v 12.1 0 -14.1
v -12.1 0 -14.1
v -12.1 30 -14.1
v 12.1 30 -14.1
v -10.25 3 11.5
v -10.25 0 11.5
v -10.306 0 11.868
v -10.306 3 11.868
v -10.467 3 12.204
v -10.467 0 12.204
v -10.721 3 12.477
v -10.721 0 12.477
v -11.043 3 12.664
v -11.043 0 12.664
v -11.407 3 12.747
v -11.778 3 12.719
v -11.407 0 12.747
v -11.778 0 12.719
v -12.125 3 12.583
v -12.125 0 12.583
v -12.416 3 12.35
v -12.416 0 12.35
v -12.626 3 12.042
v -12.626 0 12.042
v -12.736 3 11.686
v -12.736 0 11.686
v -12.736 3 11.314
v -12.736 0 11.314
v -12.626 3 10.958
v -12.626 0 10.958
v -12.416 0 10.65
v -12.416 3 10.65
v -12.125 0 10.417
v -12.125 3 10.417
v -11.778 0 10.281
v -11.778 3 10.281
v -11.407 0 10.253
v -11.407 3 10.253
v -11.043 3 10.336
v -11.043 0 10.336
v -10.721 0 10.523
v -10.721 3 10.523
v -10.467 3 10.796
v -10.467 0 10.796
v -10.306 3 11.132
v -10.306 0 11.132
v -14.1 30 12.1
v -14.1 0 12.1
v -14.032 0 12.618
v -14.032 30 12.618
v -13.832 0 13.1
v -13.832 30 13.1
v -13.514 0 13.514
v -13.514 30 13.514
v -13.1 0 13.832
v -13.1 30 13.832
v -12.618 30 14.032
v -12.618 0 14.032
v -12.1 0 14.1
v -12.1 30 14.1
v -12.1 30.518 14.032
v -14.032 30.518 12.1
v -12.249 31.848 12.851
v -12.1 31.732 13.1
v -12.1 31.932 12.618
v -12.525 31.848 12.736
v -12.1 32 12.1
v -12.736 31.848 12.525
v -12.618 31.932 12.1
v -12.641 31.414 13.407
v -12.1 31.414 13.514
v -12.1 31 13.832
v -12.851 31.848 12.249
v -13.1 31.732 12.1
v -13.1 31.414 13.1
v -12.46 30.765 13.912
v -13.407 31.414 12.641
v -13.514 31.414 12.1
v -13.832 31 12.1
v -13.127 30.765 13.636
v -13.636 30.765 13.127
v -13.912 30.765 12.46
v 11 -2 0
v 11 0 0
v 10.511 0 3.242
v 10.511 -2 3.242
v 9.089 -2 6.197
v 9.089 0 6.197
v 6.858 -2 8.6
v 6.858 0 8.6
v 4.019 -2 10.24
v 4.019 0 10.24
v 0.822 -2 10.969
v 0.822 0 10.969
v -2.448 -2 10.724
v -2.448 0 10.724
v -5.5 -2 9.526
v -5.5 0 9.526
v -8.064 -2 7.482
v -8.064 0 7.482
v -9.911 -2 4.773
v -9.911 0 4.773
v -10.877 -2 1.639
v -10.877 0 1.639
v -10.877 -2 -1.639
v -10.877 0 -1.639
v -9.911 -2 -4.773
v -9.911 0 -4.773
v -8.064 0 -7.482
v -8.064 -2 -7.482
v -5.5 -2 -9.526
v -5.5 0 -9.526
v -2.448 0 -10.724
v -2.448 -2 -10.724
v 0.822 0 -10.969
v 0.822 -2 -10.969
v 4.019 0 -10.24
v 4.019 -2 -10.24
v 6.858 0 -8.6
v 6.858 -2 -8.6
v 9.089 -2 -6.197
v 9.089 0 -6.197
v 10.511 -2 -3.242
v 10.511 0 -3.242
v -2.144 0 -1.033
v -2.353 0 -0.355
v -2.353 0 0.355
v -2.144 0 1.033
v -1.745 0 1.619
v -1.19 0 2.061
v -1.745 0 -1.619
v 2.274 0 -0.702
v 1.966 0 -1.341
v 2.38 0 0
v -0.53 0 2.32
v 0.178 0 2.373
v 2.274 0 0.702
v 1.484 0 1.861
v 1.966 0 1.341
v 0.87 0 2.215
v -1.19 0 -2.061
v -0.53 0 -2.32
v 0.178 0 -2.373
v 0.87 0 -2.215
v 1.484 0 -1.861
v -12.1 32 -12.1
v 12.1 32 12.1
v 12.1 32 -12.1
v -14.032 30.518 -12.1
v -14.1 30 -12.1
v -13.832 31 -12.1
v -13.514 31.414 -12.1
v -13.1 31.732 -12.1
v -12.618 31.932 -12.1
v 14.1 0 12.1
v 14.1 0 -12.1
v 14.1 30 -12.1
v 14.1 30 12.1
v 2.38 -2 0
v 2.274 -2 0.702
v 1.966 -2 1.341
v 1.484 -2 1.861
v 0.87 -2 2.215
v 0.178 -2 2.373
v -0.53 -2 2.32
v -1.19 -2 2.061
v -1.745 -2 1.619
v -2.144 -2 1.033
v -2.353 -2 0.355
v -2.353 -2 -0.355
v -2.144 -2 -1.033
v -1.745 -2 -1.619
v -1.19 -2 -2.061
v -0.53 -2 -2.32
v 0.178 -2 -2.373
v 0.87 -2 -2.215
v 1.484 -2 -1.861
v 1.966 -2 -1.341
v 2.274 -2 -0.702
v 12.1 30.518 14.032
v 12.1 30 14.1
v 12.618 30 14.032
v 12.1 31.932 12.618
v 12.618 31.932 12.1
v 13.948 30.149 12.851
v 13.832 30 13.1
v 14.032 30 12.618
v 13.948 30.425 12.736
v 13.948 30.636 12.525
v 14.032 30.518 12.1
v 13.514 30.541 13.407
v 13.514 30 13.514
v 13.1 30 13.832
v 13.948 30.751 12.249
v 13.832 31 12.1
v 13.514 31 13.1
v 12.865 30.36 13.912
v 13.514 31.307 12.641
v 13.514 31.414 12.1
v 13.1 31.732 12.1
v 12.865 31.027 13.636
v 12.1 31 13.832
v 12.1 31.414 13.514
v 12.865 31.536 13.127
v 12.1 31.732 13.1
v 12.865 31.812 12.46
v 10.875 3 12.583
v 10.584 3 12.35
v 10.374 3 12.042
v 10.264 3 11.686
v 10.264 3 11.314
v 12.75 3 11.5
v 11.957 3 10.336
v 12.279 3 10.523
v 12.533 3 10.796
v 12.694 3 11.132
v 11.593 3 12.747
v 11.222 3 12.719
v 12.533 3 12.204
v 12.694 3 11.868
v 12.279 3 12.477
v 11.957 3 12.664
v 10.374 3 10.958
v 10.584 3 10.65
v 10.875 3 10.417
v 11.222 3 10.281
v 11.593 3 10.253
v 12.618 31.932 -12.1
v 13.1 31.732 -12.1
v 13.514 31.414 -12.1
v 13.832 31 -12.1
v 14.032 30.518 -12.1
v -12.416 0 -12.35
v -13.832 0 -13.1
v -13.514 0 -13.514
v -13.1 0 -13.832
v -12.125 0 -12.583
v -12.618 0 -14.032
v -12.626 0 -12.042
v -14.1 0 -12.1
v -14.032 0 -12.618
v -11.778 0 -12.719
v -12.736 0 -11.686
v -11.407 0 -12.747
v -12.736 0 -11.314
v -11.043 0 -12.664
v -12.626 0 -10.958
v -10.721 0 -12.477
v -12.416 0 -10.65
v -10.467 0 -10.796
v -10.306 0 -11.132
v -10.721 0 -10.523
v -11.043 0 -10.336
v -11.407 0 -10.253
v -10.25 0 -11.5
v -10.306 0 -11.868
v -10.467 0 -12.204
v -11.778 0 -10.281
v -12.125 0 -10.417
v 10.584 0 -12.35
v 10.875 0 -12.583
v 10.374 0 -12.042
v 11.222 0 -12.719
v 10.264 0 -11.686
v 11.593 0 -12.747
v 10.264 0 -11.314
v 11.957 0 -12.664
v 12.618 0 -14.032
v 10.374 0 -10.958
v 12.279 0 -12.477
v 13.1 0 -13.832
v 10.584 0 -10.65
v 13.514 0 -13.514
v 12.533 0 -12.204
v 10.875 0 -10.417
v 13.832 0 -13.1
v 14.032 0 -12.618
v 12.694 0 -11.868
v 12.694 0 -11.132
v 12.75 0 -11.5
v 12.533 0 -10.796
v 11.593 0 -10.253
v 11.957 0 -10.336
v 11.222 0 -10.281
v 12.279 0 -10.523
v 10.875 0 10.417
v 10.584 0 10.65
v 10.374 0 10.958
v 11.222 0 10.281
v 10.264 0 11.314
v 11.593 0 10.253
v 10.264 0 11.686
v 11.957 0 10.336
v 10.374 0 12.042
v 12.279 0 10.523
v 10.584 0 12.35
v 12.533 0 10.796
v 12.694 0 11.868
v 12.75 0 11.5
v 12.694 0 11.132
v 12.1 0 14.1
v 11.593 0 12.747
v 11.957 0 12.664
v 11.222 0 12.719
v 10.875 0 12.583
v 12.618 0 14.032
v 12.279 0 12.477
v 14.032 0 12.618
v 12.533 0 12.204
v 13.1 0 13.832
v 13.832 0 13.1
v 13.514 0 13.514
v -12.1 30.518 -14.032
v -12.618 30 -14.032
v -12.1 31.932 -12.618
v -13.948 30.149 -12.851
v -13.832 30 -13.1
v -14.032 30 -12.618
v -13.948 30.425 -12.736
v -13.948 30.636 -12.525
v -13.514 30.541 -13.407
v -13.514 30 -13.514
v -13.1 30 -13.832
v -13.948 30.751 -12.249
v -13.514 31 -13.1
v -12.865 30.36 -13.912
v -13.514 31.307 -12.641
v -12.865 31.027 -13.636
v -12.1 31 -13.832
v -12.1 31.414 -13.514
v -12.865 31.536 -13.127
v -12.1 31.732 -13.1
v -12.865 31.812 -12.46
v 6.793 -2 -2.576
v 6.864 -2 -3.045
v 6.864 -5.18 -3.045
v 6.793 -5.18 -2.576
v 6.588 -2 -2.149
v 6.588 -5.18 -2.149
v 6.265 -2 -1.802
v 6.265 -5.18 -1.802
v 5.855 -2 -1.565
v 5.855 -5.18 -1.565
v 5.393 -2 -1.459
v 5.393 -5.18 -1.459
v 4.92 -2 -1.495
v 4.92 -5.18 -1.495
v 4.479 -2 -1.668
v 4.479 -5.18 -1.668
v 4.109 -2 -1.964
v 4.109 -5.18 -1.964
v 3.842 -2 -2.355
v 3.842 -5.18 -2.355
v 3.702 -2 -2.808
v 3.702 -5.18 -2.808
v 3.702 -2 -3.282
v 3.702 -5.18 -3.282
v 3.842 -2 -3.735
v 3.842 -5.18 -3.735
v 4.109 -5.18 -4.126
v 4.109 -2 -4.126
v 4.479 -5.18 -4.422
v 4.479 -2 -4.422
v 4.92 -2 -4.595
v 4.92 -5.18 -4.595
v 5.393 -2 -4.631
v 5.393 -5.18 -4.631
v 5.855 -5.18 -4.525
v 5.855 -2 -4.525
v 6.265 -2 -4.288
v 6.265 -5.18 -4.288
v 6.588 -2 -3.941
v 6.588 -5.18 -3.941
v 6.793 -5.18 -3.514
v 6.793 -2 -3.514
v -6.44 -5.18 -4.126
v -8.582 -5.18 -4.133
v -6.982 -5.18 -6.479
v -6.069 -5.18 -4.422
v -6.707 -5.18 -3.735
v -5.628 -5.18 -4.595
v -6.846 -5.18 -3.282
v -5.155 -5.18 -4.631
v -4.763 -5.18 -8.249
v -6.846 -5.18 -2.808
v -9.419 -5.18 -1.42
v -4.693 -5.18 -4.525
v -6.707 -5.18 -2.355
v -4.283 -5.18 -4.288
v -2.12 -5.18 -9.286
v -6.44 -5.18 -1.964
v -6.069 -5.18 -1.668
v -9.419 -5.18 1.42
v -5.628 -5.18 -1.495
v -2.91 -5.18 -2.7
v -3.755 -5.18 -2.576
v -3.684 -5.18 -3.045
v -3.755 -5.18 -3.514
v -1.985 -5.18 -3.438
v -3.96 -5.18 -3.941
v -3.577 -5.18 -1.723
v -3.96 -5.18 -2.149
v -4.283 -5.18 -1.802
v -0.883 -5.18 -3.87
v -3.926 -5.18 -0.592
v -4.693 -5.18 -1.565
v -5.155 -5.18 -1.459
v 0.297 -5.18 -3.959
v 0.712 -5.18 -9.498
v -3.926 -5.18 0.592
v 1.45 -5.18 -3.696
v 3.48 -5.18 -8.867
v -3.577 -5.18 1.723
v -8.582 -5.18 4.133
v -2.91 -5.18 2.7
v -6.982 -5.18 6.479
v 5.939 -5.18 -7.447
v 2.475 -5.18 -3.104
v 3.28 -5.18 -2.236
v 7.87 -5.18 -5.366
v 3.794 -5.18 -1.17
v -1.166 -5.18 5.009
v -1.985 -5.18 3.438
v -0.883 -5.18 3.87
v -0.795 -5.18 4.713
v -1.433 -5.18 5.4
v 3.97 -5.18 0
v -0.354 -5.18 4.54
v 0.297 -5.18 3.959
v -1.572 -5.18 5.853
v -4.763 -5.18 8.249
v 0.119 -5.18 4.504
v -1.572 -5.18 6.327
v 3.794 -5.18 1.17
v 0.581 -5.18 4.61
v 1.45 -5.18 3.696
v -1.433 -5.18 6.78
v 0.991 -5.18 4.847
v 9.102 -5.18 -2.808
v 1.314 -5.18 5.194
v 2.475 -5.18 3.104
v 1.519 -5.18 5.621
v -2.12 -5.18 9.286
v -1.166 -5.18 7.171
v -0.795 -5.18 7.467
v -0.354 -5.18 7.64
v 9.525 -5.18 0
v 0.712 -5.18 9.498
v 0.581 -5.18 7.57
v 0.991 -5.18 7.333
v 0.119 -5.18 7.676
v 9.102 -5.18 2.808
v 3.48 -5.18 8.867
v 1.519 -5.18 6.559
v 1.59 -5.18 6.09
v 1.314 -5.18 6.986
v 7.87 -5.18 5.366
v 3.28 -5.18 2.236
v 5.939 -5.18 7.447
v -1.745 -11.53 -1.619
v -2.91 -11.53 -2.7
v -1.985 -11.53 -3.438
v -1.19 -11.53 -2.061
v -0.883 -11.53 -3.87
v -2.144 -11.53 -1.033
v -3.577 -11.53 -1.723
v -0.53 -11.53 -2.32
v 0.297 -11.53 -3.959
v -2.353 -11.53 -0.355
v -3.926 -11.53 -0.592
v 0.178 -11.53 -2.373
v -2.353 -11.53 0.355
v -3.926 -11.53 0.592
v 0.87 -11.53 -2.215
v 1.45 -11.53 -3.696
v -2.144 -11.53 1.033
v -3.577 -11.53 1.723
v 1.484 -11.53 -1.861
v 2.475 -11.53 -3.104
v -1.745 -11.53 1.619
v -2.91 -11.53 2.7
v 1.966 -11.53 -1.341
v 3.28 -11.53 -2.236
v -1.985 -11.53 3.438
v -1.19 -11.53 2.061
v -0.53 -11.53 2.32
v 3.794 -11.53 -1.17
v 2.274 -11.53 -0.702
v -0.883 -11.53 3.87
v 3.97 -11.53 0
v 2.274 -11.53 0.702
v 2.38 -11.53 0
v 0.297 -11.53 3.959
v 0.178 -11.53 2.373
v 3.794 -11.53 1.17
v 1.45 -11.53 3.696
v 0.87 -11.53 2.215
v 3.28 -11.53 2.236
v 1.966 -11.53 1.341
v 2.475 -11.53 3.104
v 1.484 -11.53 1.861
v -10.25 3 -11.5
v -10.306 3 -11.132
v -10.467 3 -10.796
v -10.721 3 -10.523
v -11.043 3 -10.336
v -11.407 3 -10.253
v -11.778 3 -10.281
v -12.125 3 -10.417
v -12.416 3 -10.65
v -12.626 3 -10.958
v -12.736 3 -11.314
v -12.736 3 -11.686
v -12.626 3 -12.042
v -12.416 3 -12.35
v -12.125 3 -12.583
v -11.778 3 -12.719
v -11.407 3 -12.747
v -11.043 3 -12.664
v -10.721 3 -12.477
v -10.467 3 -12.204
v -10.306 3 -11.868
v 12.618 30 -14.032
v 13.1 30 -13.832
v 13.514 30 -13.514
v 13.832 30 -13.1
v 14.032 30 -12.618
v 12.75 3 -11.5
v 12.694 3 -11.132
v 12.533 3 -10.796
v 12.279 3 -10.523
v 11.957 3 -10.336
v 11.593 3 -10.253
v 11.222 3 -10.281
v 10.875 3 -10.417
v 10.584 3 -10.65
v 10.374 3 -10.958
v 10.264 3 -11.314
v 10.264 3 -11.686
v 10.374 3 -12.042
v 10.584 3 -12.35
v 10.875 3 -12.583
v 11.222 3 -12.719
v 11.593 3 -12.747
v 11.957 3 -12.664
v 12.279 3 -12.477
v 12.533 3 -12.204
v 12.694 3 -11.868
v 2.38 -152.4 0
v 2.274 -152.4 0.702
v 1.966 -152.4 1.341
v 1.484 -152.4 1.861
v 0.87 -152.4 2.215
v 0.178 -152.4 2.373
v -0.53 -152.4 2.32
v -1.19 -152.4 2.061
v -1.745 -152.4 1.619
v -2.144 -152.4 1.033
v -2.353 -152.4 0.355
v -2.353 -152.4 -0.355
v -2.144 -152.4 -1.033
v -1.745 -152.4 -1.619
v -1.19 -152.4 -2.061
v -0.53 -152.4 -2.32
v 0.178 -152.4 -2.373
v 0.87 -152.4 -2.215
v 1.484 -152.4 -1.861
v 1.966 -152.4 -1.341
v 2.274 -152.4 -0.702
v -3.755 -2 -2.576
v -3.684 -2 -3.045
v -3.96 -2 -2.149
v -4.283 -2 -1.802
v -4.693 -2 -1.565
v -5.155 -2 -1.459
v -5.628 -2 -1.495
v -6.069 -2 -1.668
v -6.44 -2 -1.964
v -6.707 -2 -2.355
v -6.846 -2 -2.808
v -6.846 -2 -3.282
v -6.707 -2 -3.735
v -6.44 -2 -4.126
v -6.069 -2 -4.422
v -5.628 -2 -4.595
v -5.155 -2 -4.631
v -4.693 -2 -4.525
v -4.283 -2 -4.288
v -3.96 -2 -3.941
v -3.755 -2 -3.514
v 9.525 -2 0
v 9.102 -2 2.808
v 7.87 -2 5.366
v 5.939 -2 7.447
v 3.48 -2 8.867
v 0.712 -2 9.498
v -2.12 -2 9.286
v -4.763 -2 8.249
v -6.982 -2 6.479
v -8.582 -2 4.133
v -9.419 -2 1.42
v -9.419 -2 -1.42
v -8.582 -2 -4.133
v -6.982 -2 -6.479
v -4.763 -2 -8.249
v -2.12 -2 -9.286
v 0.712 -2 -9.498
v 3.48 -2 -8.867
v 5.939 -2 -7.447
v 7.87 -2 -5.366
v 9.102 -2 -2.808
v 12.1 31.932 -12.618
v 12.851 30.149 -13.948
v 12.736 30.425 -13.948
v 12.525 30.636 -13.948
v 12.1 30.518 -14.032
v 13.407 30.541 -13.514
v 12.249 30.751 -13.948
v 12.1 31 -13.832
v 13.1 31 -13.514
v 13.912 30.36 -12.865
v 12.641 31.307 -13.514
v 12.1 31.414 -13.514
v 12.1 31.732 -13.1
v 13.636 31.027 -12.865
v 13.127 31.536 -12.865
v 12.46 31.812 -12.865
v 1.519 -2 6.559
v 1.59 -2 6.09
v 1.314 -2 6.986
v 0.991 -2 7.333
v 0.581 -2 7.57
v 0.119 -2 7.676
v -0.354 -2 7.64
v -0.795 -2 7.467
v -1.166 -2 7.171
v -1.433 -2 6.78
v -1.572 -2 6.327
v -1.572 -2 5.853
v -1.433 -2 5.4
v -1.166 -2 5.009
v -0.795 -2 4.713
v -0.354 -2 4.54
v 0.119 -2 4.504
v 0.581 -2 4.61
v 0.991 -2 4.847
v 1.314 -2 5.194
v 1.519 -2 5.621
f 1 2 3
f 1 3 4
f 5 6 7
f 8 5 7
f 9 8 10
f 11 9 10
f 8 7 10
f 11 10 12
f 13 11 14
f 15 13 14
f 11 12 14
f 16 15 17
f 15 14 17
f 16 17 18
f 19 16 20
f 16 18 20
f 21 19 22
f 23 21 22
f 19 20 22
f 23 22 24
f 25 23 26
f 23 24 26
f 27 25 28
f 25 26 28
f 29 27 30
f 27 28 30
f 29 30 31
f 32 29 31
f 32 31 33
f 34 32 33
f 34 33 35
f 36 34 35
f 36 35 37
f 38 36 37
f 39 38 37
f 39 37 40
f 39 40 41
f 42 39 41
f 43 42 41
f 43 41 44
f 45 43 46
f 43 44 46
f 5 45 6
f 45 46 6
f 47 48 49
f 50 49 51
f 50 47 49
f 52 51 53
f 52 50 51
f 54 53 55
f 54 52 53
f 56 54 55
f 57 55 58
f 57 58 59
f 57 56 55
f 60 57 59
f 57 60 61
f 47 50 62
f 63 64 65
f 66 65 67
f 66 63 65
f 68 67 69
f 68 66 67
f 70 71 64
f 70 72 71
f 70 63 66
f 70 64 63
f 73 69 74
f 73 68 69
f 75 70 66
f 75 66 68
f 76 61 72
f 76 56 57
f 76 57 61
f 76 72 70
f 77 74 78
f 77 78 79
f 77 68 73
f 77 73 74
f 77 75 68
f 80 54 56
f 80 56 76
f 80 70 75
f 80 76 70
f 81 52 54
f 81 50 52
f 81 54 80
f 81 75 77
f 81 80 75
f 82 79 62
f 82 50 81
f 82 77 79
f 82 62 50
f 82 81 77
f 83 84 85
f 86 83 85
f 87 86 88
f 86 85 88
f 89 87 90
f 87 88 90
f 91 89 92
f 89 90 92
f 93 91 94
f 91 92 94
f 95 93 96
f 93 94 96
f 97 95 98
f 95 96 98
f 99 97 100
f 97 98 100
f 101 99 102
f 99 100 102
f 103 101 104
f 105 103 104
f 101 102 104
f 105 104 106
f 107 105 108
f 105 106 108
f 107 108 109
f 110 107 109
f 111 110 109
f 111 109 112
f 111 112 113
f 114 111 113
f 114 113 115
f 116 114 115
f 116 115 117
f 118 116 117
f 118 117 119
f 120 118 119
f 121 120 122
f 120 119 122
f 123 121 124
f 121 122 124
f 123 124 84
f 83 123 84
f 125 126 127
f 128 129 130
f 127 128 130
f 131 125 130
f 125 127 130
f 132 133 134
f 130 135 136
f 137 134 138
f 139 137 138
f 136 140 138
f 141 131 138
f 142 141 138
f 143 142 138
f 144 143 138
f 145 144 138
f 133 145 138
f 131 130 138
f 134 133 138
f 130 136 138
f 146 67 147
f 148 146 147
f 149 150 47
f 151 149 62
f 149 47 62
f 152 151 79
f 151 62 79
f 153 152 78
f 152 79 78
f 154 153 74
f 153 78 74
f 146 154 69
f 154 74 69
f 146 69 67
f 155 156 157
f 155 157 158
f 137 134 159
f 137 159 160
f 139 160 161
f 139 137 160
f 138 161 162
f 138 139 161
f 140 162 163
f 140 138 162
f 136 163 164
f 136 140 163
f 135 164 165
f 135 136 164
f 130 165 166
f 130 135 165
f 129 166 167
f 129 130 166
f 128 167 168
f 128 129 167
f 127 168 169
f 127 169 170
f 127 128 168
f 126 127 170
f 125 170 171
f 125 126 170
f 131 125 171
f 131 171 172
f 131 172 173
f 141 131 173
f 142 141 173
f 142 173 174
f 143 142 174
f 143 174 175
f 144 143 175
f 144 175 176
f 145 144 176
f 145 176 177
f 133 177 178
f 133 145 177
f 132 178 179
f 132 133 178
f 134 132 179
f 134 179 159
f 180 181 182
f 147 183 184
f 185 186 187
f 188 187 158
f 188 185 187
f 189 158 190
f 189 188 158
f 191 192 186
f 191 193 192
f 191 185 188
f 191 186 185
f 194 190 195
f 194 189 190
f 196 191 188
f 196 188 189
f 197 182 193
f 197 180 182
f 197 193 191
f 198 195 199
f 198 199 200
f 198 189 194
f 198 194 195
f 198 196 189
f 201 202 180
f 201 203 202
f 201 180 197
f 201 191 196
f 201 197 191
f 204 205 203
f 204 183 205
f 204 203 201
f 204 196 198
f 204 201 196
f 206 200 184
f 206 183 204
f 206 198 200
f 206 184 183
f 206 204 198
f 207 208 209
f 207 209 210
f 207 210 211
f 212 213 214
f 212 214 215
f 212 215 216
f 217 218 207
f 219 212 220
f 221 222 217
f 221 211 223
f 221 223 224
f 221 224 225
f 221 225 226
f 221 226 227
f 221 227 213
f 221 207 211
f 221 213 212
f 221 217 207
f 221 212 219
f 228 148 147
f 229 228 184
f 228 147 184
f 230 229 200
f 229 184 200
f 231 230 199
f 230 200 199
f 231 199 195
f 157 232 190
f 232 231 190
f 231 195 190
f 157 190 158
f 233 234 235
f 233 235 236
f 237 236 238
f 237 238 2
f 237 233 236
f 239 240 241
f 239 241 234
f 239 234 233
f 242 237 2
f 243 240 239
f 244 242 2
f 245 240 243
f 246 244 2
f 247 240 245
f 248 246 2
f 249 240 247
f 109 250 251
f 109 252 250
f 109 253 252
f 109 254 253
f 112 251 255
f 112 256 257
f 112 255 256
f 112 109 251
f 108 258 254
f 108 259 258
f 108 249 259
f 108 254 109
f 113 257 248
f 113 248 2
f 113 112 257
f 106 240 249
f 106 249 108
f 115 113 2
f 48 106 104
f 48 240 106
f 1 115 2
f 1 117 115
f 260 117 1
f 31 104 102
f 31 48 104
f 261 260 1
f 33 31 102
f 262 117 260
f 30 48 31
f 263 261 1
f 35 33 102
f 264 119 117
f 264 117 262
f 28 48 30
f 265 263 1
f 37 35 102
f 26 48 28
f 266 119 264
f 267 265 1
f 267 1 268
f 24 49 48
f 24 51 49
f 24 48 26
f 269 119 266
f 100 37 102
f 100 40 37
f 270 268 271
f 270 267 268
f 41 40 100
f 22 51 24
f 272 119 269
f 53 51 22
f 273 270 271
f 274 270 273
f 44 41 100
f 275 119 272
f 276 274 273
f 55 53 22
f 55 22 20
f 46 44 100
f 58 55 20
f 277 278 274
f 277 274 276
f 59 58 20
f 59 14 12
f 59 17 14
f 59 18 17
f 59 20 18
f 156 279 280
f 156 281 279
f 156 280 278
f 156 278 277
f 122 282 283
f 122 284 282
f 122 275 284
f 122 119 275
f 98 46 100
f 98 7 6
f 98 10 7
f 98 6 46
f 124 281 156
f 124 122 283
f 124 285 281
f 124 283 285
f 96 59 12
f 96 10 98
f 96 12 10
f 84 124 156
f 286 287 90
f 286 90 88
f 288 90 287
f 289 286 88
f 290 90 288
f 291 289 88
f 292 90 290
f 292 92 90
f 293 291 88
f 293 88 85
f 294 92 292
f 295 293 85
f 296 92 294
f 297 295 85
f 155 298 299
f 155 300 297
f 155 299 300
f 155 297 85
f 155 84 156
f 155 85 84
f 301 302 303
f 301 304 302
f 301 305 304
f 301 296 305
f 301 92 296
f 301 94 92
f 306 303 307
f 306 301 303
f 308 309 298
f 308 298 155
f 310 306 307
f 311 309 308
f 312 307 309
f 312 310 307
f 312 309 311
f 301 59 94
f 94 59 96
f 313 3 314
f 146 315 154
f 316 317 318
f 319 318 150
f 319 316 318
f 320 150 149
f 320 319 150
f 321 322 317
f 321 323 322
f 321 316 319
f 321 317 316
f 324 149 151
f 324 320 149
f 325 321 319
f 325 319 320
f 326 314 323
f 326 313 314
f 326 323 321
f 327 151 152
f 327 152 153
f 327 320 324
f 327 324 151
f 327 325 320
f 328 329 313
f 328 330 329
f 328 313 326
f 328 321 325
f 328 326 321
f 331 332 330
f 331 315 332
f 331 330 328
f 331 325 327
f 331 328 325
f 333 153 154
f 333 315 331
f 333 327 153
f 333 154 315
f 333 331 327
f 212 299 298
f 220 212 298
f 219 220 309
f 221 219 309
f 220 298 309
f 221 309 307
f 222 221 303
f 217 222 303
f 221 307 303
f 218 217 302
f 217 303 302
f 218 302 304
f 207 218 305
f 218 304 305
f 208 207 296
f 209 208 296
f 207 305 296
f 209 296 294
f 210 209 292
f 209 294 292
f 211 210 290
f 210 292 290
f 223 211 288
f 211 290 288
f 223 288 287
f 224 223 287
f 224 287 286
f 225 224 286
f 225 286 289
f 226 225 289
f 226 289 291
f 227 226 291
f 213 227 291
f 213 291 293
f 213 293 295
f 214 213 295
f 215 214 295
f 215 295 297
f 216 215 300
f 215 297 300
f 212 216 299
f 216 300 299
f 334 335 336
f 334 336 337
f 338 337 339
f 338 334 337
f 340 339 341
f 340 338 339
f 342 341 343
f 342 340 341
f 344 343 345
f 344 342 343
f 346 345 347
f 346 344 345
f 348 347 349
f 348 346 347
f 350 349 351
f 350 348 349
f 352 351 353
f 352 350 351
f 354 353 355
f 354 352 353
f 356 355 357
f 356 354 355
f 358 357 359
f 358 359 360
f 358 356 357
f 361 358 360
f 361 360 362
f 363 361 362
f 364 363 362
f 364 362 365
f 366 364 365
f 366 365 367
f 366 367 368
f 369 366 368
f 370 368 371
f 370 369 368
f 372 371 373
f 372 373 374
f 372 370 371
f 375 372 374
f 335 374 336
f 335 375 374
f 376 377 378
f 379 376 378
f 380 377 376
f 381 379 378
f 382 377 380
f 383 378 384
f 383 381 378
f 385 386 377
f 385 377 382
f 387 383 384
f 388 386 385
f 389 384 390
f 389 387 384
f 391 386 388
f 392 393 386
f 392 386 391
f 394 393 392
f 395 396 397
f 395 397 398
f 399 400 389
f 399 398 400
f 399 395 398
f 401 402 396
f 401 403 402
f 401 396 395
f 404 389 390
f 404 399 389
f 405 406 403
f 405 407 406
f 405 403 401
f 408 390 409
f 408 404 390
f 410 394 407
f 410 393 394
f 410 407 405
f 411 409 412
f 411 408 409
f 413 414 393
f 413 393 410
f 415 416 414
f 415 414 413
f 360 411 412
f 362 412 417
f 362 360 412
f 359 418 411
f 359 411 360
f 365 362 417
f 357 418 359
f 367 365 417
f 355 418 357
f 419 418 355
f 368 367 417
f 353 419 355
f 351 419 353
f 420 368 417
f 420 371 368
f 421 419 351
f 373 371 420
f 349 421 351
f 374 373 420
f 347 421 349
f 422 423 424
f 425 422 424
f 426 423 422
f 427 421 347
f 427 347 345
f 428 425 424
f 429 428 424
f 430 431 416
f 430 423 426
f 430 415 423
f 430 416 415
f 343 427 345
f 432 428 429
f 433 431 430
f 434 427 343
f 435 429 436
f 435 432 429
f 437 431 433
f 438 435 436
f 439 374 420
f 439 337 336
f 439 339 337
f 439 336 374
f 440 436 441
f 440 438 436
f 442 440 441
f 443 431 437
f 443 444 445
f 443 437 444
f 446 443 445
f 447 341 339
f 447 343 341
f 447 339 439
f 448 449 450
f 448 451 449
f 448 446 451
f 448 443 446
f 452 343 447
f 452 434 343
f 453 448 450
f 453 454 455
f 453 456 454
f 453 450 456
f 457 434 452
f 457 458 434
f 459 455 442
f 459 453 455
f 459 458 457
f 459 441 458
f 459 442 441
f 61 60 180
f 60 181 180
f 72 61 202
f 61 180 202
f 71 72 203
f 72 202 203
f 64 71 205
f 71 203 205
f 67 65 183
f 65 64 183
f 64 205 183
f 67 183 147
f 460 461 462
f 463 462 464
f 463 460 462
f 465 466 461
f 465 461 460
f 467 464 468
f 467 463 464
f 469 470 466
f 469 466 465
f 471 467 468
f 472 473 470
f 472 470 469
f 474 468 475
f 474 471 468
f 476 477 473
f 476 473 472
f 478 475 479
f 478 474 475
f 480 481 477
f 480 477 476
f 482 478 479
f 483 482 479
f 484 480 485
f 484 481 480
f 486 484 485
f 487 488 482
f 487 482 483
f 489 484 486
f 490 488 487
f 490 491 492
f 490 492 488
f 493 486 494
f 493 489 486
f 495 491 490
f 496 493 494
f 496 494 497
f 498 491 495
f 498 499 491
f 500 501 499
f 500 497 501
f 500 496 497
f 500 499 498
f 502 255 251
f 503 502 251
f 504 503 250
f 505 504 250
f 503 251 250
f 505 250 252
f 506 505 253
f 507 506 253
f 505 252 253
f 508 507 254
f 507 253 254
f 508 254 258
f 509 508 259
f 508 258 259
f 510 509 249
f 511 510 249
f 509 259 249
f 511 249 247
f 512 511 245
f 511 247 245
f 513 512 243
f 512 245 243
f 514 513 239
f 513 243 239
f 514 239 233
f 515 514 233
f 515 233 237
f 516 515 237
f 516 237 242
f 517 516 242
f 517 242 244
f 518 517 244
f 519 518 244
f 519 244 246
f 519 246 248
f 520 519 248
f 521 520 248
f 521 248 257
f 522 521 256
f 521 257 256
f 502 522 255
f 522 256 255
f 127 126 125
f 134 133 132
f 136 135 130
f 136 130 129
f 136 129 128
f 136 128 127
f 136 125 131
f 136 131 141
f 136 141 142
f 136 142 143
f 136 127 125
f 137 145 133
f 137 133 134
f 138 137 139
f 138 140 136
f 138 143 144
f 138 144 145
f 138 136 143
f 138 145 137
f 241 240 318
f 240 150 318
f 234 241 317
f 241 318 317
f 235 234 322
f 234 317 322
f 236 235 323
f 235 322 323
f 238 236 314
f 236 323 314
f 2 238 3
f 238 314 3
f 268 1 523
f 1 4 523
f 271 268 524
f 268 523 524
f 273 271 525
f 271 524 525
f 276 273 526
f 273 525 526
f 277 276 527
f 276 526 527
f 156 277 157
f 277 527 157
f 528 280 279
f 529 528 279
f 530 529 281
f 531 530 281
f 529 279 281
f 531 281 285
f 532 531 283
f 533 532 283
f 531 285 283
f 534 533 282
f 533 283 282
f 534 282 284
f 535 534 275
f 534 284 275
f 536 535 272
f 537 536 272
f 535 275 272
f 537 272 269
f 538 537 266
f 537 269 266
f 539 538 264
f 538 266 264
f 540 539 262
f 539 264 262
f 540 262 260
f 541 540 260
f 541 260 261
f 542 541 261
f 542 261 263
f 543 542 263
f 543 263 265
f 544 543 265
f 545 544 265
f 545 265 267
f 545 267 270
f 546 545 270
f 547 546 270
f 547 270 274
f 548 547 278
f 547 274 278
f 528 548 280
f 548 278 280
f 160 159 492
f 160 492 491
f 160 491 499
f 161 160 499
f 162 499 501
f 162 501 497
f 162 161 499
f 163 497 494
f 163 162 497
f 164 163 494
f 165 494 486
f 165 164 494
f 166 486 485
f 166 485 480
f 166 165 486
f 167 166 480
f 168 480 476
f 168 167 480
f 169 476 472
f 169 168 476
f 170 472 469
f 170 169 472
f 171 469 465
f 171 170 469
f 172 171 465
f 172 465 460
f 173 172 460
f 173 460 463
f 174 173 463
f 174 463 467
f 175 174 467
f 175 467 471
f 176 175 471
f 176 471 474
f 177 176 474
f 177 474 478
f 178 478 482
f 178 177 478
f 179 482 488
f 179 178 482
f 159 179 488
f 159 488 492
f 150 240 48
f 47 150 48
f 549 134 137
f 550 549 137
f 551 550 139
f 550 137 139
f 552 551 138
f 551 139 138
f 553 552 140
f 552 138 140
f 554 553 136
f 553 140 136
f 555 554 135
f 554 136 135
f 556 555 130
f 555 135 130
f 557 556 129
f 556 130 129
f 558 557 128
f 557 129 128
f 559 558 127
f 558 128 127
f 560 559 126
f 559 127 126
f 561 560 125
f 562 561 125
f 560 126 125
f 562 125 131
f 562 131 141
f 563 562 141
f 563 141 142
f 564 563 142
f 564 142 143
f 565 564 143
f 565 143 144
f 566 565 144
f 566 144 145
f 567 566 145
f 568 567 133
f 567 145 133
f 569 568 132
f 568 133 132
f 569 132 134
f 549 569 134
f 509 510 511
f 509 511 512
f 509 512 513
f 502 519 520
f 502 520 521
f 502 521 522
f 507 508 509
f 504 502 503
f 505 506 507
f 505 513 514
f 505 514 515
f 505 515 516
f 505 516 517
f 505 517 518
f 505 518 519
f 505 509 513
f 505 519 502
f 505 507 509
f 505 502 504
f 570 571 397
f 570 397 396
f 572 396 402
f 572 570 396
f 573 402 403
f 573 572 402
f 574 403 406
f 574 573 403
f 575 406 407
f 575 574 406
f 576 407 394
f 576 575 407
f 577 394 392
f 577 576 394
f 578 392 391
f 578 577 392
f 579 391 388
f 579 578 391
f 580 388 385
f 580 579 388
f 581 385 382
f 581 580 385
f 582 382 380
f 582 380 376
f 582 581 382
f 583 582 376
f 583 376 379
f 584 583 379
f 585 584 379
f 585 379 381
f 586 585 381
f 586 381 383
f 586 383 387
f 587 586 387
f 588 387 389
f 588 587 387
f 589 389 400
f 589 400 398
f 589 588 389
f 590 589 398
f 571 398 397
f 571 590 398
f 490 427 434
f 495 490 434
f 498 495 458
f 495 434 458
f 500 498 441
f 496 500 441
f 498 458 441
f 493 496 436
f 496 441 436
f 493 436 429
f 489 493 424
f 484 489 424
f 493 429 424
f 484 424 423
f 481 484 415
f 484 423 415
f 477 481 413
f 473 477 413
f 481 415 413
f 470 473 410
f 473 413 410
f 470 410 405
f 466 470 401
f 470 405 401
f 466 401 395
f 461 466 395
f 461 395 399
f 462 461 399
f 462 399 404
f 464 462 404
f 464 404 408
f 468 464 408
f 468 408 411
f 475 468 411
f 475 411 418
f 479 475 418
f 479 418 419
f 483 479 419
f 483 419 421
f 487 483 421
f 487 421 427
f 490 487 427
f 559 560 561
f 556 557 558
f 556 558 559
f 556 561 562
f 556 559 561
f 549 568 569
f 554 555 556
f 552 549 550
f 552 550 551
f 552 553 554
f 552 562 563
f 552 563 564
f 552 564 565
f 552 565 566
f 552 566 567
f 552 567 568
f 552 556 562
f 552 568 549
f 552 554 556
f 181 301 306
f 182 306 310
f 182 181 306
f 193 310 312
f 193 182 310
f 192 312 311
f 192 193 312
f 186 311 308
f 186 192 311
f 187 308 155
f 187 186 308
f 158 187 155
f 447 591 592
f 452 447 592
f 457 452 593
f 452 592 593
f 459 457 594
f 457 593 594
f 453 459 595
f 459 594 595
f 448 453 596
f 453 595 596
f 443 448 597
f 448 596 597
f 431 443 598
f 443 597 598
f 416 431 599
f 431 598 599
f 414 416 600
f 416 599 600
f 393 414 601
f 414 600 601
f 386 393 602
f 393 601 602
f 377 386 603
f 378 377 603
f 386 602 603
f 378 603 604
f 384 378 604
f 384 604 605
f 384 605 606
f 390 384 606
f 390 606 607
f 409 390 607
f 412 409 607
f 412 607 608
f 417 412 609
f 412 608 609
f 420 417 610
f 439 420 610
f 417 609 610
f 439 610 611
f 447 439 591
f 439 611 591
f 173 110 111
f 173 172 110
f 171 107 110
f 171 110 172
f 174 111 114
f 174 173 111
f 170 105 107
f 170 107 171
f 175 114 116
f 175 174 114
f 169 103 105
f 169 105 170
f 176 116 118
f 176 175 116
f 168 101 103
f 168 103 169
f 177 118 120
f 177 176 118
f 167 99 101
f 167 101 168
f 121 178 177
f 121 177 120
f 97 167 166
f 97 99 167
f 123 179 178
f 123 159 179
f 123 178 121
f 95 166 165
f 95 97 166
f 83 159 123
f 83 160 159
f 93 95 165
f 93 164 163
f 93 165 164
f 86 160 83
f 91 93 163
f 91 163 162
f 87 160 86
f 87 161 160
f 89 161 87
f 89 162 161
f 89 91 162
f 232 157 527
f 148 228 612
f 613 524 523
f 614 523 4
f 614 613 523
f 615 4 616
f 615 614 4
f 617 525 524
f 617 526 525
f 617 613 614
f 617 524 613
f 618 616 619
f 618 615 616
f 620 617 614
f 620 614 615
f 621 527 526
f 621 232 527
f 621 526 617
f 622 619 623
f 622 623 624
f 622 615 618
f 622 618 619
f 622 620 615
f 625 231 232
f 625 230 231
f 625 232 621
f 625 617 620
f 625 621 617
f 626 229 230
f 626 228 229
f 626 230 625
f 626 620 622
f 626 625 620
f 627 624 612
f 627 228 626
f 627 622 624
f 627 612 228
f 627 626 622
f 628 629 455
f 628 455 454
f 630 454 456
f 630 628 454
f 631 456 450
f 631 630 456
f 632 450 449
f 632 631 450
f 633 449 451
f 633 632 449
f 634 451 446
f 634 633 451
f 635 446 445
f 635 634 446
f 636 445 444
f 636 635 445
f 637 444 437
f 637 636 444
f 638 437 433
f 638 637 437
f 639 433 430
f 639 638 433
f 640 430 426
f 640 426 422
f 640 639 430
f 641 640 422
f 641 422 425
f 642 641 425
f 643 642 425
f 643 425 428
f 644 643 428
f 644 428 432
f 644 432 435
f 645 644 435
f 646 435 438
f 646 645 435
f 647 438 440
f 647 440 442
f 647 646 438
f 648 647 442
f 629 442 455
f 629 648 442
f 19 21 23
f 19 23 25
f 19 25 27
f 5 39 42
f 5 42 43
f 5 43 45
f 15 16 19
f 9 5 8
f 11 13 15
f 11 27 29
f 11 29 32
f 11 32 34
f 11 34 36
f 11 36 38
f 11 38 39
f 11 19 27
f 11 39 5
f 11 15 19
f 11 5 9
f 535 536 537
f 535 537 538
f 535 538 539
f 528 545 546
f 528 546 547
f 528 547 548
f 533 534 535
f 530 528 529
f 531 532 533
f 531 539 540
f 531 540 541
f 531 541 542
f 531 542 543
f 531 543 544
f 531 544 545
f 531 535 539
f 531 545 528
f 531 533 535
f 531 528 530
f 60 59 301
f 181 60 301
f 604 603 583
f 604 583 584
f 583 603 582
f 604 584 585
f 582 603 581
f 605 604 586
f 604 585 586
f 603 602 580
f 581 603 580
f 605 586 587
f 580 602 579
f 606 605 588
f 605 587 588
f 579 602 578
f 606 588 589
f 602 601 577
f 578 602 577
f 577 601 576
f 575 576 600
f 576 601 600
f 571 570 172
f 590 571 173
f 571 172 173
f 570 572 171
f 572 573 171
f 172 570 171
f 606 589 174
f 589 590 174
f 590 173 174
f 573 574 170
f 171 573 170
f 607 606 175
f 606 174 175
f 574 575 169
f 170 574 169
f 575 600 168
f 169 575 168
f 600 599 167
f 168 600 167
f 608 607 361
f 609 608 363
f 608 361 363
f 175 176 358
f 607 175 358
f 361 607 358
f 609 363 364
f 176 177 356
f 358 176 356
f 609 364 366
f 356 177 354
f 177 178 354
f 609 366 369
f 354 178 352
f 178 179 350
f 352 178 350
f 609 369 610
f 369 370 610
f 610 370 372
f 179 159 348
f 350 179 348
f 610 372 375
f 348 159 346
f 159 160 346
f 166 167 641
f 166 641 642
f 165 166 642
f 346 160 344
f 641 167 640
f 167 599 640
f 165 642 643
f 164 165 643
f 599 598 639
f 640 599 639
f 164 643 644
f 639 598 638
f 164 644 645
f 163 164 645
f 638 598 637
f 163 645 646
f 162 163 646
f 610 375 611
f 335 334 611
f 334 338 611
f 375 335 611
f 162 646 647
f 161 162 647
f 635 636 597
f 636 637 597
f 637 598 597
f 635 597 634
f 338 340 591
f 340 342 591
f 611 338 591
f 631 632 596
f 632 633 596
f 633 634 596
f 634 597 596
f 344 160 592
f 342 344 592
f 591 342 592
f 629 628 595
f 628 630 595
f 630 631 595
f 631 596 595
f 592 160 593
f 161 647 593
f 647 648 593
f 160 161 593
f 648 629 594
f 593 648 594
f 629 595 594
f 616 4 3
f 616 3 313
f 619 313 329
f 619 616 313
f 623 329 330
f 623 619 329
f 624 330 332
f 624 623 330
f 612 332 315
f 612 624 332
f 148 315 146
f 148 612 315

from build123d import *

# Parameters (mm, degrees)
F0_W     = 28.2
F0_H     = 28.2
F0_R     = 1.25
F0_R_2   = 11
F0_R_3   = 2.38
F1_DEPTH = 32
F2_DEPTH = 152.4
F3_DEPTH = 2
F4_DEPTH = 3
F5_R     = 2
F6_R     = 3.97
F6_R_2   = 2.38
F7_DEPTH = 9.53
F6_R_3   = 9.525
F6_R_4   = 1.59
F8_DEPTH = 3.18


with BuildPart() as f1:
    # F0 (on Front) → F1 (new body)
    with BuildSketch(Plane.XZ):
        Rectangle(F0_W, F0_H)
        with Locations((-11.5, -11.5)):
            Circle(F0_R, mode=Mode.SUBTRACT)
        with Locations((11.5, -11.5)):
            Circle(F0_R, mode=Mode.SUBTRACT)
        with Locations((-11.5, 11.5)):
            Circle(F0_R, mode=Mode.SUBTRACT)
        Circle(F0_R_2, mode=Mode.SUBTRACT)
        with Locations((11.5, 11.5)):
            Circle(F0_R, mode=Mode.SUBTRACT)
        with Locations((11.5, 11.5)):
            Circle(F0_R)
        with Locations((11.5, -11.5)):
            Circle(F0_R)
        with Locations((-11.5, -11.5)):
            Circle(F0_R)
        with Locations((-11.5, 11.5)):
            Circle(F0_R)
        Circle(F0_R_2)
        Circle(F0_R_3, mode=Mode.SUBTRACT)
        Circle(F0_R_3)
    extrude(amount=-F1_DEPTH)

    # F0 (on Front) → F3 (join)
    with BuildSketch(Plane.XZ):
        Circle(F0_R_2)
        Circle(F0_R_3, mode=Mode.SUBTRACT)
    extrude(amount=F3_DEPTH)

    # F0 (on Front) → F4 (cut)
    with BuildSketch(Plane.XZ):
        with Locations((-11.5, 11.5)):
            Circle(F0_R)
        with Locations((11.5, 11.5)):
            Circle(F0_R)
        with Locations((11.5, -11.5)):
            Circle(F0_R)
        with Locations((-11.5, -11.5)):
            Circle(F0_R)
    extrude(amount=-F4_DEPTH, mode=Mode.SUBTRACT)

    # F5
    f5_edges = [f1.edges().sort_by_distance(p)[0] for p in [
        (-14.1, 16, 14.1),
        (0, 32, 14.1),
        (14.1, 16, 14.1),
        (14.1, 32, 0),
        (14.1, 16, -14.1),
        (0, 32, -14.1),
        (-14.1, 16, -14.1),
        (-14.1, 32, 0),
    ]]
    fillet(f5_edges, radius=F5_R)


with BuildPart() as f2:
    # F0 (on Front) → F2 (new body)
    with BuildSketch(Plane.XZ):
        Circle(F0_R_3)
    extrude(amount=F2_DEPTH)


with BuildPart() as f7:
    # F6 (on face) → F7 (new body)
    with BuildSketch(Plane.XZ.offset(2)):
        Circle(F6_R)
        Circle(F6_R_2, mode=Mode.SUBTRACT)
    extrude(amount=F7_DEPTH)

    # F6 (on face) → F8 (join)
    with BuildSketch(Plane.XZ.offset(2)):
        Circle(F6_R_3)
        with Locations((-5.274094709, -3.045)):
            Circle(F6_R_4, mode=Mode.SUBTRACT)
        with Locations((5.274094709, -3.045)):
            Circle(F6_R_4, mode=Mode.SUBTRACT)
        Circle(F6_R, mode=Mode.SUBTRACT)
        with Locations((0, 6.09)):
            Circle(F6_R_4, mode=Mode.SUBTRACT)
    extrude(amount=F8_DEPTH)


solid = Compound([f1.part, f2.part, f7.part])
